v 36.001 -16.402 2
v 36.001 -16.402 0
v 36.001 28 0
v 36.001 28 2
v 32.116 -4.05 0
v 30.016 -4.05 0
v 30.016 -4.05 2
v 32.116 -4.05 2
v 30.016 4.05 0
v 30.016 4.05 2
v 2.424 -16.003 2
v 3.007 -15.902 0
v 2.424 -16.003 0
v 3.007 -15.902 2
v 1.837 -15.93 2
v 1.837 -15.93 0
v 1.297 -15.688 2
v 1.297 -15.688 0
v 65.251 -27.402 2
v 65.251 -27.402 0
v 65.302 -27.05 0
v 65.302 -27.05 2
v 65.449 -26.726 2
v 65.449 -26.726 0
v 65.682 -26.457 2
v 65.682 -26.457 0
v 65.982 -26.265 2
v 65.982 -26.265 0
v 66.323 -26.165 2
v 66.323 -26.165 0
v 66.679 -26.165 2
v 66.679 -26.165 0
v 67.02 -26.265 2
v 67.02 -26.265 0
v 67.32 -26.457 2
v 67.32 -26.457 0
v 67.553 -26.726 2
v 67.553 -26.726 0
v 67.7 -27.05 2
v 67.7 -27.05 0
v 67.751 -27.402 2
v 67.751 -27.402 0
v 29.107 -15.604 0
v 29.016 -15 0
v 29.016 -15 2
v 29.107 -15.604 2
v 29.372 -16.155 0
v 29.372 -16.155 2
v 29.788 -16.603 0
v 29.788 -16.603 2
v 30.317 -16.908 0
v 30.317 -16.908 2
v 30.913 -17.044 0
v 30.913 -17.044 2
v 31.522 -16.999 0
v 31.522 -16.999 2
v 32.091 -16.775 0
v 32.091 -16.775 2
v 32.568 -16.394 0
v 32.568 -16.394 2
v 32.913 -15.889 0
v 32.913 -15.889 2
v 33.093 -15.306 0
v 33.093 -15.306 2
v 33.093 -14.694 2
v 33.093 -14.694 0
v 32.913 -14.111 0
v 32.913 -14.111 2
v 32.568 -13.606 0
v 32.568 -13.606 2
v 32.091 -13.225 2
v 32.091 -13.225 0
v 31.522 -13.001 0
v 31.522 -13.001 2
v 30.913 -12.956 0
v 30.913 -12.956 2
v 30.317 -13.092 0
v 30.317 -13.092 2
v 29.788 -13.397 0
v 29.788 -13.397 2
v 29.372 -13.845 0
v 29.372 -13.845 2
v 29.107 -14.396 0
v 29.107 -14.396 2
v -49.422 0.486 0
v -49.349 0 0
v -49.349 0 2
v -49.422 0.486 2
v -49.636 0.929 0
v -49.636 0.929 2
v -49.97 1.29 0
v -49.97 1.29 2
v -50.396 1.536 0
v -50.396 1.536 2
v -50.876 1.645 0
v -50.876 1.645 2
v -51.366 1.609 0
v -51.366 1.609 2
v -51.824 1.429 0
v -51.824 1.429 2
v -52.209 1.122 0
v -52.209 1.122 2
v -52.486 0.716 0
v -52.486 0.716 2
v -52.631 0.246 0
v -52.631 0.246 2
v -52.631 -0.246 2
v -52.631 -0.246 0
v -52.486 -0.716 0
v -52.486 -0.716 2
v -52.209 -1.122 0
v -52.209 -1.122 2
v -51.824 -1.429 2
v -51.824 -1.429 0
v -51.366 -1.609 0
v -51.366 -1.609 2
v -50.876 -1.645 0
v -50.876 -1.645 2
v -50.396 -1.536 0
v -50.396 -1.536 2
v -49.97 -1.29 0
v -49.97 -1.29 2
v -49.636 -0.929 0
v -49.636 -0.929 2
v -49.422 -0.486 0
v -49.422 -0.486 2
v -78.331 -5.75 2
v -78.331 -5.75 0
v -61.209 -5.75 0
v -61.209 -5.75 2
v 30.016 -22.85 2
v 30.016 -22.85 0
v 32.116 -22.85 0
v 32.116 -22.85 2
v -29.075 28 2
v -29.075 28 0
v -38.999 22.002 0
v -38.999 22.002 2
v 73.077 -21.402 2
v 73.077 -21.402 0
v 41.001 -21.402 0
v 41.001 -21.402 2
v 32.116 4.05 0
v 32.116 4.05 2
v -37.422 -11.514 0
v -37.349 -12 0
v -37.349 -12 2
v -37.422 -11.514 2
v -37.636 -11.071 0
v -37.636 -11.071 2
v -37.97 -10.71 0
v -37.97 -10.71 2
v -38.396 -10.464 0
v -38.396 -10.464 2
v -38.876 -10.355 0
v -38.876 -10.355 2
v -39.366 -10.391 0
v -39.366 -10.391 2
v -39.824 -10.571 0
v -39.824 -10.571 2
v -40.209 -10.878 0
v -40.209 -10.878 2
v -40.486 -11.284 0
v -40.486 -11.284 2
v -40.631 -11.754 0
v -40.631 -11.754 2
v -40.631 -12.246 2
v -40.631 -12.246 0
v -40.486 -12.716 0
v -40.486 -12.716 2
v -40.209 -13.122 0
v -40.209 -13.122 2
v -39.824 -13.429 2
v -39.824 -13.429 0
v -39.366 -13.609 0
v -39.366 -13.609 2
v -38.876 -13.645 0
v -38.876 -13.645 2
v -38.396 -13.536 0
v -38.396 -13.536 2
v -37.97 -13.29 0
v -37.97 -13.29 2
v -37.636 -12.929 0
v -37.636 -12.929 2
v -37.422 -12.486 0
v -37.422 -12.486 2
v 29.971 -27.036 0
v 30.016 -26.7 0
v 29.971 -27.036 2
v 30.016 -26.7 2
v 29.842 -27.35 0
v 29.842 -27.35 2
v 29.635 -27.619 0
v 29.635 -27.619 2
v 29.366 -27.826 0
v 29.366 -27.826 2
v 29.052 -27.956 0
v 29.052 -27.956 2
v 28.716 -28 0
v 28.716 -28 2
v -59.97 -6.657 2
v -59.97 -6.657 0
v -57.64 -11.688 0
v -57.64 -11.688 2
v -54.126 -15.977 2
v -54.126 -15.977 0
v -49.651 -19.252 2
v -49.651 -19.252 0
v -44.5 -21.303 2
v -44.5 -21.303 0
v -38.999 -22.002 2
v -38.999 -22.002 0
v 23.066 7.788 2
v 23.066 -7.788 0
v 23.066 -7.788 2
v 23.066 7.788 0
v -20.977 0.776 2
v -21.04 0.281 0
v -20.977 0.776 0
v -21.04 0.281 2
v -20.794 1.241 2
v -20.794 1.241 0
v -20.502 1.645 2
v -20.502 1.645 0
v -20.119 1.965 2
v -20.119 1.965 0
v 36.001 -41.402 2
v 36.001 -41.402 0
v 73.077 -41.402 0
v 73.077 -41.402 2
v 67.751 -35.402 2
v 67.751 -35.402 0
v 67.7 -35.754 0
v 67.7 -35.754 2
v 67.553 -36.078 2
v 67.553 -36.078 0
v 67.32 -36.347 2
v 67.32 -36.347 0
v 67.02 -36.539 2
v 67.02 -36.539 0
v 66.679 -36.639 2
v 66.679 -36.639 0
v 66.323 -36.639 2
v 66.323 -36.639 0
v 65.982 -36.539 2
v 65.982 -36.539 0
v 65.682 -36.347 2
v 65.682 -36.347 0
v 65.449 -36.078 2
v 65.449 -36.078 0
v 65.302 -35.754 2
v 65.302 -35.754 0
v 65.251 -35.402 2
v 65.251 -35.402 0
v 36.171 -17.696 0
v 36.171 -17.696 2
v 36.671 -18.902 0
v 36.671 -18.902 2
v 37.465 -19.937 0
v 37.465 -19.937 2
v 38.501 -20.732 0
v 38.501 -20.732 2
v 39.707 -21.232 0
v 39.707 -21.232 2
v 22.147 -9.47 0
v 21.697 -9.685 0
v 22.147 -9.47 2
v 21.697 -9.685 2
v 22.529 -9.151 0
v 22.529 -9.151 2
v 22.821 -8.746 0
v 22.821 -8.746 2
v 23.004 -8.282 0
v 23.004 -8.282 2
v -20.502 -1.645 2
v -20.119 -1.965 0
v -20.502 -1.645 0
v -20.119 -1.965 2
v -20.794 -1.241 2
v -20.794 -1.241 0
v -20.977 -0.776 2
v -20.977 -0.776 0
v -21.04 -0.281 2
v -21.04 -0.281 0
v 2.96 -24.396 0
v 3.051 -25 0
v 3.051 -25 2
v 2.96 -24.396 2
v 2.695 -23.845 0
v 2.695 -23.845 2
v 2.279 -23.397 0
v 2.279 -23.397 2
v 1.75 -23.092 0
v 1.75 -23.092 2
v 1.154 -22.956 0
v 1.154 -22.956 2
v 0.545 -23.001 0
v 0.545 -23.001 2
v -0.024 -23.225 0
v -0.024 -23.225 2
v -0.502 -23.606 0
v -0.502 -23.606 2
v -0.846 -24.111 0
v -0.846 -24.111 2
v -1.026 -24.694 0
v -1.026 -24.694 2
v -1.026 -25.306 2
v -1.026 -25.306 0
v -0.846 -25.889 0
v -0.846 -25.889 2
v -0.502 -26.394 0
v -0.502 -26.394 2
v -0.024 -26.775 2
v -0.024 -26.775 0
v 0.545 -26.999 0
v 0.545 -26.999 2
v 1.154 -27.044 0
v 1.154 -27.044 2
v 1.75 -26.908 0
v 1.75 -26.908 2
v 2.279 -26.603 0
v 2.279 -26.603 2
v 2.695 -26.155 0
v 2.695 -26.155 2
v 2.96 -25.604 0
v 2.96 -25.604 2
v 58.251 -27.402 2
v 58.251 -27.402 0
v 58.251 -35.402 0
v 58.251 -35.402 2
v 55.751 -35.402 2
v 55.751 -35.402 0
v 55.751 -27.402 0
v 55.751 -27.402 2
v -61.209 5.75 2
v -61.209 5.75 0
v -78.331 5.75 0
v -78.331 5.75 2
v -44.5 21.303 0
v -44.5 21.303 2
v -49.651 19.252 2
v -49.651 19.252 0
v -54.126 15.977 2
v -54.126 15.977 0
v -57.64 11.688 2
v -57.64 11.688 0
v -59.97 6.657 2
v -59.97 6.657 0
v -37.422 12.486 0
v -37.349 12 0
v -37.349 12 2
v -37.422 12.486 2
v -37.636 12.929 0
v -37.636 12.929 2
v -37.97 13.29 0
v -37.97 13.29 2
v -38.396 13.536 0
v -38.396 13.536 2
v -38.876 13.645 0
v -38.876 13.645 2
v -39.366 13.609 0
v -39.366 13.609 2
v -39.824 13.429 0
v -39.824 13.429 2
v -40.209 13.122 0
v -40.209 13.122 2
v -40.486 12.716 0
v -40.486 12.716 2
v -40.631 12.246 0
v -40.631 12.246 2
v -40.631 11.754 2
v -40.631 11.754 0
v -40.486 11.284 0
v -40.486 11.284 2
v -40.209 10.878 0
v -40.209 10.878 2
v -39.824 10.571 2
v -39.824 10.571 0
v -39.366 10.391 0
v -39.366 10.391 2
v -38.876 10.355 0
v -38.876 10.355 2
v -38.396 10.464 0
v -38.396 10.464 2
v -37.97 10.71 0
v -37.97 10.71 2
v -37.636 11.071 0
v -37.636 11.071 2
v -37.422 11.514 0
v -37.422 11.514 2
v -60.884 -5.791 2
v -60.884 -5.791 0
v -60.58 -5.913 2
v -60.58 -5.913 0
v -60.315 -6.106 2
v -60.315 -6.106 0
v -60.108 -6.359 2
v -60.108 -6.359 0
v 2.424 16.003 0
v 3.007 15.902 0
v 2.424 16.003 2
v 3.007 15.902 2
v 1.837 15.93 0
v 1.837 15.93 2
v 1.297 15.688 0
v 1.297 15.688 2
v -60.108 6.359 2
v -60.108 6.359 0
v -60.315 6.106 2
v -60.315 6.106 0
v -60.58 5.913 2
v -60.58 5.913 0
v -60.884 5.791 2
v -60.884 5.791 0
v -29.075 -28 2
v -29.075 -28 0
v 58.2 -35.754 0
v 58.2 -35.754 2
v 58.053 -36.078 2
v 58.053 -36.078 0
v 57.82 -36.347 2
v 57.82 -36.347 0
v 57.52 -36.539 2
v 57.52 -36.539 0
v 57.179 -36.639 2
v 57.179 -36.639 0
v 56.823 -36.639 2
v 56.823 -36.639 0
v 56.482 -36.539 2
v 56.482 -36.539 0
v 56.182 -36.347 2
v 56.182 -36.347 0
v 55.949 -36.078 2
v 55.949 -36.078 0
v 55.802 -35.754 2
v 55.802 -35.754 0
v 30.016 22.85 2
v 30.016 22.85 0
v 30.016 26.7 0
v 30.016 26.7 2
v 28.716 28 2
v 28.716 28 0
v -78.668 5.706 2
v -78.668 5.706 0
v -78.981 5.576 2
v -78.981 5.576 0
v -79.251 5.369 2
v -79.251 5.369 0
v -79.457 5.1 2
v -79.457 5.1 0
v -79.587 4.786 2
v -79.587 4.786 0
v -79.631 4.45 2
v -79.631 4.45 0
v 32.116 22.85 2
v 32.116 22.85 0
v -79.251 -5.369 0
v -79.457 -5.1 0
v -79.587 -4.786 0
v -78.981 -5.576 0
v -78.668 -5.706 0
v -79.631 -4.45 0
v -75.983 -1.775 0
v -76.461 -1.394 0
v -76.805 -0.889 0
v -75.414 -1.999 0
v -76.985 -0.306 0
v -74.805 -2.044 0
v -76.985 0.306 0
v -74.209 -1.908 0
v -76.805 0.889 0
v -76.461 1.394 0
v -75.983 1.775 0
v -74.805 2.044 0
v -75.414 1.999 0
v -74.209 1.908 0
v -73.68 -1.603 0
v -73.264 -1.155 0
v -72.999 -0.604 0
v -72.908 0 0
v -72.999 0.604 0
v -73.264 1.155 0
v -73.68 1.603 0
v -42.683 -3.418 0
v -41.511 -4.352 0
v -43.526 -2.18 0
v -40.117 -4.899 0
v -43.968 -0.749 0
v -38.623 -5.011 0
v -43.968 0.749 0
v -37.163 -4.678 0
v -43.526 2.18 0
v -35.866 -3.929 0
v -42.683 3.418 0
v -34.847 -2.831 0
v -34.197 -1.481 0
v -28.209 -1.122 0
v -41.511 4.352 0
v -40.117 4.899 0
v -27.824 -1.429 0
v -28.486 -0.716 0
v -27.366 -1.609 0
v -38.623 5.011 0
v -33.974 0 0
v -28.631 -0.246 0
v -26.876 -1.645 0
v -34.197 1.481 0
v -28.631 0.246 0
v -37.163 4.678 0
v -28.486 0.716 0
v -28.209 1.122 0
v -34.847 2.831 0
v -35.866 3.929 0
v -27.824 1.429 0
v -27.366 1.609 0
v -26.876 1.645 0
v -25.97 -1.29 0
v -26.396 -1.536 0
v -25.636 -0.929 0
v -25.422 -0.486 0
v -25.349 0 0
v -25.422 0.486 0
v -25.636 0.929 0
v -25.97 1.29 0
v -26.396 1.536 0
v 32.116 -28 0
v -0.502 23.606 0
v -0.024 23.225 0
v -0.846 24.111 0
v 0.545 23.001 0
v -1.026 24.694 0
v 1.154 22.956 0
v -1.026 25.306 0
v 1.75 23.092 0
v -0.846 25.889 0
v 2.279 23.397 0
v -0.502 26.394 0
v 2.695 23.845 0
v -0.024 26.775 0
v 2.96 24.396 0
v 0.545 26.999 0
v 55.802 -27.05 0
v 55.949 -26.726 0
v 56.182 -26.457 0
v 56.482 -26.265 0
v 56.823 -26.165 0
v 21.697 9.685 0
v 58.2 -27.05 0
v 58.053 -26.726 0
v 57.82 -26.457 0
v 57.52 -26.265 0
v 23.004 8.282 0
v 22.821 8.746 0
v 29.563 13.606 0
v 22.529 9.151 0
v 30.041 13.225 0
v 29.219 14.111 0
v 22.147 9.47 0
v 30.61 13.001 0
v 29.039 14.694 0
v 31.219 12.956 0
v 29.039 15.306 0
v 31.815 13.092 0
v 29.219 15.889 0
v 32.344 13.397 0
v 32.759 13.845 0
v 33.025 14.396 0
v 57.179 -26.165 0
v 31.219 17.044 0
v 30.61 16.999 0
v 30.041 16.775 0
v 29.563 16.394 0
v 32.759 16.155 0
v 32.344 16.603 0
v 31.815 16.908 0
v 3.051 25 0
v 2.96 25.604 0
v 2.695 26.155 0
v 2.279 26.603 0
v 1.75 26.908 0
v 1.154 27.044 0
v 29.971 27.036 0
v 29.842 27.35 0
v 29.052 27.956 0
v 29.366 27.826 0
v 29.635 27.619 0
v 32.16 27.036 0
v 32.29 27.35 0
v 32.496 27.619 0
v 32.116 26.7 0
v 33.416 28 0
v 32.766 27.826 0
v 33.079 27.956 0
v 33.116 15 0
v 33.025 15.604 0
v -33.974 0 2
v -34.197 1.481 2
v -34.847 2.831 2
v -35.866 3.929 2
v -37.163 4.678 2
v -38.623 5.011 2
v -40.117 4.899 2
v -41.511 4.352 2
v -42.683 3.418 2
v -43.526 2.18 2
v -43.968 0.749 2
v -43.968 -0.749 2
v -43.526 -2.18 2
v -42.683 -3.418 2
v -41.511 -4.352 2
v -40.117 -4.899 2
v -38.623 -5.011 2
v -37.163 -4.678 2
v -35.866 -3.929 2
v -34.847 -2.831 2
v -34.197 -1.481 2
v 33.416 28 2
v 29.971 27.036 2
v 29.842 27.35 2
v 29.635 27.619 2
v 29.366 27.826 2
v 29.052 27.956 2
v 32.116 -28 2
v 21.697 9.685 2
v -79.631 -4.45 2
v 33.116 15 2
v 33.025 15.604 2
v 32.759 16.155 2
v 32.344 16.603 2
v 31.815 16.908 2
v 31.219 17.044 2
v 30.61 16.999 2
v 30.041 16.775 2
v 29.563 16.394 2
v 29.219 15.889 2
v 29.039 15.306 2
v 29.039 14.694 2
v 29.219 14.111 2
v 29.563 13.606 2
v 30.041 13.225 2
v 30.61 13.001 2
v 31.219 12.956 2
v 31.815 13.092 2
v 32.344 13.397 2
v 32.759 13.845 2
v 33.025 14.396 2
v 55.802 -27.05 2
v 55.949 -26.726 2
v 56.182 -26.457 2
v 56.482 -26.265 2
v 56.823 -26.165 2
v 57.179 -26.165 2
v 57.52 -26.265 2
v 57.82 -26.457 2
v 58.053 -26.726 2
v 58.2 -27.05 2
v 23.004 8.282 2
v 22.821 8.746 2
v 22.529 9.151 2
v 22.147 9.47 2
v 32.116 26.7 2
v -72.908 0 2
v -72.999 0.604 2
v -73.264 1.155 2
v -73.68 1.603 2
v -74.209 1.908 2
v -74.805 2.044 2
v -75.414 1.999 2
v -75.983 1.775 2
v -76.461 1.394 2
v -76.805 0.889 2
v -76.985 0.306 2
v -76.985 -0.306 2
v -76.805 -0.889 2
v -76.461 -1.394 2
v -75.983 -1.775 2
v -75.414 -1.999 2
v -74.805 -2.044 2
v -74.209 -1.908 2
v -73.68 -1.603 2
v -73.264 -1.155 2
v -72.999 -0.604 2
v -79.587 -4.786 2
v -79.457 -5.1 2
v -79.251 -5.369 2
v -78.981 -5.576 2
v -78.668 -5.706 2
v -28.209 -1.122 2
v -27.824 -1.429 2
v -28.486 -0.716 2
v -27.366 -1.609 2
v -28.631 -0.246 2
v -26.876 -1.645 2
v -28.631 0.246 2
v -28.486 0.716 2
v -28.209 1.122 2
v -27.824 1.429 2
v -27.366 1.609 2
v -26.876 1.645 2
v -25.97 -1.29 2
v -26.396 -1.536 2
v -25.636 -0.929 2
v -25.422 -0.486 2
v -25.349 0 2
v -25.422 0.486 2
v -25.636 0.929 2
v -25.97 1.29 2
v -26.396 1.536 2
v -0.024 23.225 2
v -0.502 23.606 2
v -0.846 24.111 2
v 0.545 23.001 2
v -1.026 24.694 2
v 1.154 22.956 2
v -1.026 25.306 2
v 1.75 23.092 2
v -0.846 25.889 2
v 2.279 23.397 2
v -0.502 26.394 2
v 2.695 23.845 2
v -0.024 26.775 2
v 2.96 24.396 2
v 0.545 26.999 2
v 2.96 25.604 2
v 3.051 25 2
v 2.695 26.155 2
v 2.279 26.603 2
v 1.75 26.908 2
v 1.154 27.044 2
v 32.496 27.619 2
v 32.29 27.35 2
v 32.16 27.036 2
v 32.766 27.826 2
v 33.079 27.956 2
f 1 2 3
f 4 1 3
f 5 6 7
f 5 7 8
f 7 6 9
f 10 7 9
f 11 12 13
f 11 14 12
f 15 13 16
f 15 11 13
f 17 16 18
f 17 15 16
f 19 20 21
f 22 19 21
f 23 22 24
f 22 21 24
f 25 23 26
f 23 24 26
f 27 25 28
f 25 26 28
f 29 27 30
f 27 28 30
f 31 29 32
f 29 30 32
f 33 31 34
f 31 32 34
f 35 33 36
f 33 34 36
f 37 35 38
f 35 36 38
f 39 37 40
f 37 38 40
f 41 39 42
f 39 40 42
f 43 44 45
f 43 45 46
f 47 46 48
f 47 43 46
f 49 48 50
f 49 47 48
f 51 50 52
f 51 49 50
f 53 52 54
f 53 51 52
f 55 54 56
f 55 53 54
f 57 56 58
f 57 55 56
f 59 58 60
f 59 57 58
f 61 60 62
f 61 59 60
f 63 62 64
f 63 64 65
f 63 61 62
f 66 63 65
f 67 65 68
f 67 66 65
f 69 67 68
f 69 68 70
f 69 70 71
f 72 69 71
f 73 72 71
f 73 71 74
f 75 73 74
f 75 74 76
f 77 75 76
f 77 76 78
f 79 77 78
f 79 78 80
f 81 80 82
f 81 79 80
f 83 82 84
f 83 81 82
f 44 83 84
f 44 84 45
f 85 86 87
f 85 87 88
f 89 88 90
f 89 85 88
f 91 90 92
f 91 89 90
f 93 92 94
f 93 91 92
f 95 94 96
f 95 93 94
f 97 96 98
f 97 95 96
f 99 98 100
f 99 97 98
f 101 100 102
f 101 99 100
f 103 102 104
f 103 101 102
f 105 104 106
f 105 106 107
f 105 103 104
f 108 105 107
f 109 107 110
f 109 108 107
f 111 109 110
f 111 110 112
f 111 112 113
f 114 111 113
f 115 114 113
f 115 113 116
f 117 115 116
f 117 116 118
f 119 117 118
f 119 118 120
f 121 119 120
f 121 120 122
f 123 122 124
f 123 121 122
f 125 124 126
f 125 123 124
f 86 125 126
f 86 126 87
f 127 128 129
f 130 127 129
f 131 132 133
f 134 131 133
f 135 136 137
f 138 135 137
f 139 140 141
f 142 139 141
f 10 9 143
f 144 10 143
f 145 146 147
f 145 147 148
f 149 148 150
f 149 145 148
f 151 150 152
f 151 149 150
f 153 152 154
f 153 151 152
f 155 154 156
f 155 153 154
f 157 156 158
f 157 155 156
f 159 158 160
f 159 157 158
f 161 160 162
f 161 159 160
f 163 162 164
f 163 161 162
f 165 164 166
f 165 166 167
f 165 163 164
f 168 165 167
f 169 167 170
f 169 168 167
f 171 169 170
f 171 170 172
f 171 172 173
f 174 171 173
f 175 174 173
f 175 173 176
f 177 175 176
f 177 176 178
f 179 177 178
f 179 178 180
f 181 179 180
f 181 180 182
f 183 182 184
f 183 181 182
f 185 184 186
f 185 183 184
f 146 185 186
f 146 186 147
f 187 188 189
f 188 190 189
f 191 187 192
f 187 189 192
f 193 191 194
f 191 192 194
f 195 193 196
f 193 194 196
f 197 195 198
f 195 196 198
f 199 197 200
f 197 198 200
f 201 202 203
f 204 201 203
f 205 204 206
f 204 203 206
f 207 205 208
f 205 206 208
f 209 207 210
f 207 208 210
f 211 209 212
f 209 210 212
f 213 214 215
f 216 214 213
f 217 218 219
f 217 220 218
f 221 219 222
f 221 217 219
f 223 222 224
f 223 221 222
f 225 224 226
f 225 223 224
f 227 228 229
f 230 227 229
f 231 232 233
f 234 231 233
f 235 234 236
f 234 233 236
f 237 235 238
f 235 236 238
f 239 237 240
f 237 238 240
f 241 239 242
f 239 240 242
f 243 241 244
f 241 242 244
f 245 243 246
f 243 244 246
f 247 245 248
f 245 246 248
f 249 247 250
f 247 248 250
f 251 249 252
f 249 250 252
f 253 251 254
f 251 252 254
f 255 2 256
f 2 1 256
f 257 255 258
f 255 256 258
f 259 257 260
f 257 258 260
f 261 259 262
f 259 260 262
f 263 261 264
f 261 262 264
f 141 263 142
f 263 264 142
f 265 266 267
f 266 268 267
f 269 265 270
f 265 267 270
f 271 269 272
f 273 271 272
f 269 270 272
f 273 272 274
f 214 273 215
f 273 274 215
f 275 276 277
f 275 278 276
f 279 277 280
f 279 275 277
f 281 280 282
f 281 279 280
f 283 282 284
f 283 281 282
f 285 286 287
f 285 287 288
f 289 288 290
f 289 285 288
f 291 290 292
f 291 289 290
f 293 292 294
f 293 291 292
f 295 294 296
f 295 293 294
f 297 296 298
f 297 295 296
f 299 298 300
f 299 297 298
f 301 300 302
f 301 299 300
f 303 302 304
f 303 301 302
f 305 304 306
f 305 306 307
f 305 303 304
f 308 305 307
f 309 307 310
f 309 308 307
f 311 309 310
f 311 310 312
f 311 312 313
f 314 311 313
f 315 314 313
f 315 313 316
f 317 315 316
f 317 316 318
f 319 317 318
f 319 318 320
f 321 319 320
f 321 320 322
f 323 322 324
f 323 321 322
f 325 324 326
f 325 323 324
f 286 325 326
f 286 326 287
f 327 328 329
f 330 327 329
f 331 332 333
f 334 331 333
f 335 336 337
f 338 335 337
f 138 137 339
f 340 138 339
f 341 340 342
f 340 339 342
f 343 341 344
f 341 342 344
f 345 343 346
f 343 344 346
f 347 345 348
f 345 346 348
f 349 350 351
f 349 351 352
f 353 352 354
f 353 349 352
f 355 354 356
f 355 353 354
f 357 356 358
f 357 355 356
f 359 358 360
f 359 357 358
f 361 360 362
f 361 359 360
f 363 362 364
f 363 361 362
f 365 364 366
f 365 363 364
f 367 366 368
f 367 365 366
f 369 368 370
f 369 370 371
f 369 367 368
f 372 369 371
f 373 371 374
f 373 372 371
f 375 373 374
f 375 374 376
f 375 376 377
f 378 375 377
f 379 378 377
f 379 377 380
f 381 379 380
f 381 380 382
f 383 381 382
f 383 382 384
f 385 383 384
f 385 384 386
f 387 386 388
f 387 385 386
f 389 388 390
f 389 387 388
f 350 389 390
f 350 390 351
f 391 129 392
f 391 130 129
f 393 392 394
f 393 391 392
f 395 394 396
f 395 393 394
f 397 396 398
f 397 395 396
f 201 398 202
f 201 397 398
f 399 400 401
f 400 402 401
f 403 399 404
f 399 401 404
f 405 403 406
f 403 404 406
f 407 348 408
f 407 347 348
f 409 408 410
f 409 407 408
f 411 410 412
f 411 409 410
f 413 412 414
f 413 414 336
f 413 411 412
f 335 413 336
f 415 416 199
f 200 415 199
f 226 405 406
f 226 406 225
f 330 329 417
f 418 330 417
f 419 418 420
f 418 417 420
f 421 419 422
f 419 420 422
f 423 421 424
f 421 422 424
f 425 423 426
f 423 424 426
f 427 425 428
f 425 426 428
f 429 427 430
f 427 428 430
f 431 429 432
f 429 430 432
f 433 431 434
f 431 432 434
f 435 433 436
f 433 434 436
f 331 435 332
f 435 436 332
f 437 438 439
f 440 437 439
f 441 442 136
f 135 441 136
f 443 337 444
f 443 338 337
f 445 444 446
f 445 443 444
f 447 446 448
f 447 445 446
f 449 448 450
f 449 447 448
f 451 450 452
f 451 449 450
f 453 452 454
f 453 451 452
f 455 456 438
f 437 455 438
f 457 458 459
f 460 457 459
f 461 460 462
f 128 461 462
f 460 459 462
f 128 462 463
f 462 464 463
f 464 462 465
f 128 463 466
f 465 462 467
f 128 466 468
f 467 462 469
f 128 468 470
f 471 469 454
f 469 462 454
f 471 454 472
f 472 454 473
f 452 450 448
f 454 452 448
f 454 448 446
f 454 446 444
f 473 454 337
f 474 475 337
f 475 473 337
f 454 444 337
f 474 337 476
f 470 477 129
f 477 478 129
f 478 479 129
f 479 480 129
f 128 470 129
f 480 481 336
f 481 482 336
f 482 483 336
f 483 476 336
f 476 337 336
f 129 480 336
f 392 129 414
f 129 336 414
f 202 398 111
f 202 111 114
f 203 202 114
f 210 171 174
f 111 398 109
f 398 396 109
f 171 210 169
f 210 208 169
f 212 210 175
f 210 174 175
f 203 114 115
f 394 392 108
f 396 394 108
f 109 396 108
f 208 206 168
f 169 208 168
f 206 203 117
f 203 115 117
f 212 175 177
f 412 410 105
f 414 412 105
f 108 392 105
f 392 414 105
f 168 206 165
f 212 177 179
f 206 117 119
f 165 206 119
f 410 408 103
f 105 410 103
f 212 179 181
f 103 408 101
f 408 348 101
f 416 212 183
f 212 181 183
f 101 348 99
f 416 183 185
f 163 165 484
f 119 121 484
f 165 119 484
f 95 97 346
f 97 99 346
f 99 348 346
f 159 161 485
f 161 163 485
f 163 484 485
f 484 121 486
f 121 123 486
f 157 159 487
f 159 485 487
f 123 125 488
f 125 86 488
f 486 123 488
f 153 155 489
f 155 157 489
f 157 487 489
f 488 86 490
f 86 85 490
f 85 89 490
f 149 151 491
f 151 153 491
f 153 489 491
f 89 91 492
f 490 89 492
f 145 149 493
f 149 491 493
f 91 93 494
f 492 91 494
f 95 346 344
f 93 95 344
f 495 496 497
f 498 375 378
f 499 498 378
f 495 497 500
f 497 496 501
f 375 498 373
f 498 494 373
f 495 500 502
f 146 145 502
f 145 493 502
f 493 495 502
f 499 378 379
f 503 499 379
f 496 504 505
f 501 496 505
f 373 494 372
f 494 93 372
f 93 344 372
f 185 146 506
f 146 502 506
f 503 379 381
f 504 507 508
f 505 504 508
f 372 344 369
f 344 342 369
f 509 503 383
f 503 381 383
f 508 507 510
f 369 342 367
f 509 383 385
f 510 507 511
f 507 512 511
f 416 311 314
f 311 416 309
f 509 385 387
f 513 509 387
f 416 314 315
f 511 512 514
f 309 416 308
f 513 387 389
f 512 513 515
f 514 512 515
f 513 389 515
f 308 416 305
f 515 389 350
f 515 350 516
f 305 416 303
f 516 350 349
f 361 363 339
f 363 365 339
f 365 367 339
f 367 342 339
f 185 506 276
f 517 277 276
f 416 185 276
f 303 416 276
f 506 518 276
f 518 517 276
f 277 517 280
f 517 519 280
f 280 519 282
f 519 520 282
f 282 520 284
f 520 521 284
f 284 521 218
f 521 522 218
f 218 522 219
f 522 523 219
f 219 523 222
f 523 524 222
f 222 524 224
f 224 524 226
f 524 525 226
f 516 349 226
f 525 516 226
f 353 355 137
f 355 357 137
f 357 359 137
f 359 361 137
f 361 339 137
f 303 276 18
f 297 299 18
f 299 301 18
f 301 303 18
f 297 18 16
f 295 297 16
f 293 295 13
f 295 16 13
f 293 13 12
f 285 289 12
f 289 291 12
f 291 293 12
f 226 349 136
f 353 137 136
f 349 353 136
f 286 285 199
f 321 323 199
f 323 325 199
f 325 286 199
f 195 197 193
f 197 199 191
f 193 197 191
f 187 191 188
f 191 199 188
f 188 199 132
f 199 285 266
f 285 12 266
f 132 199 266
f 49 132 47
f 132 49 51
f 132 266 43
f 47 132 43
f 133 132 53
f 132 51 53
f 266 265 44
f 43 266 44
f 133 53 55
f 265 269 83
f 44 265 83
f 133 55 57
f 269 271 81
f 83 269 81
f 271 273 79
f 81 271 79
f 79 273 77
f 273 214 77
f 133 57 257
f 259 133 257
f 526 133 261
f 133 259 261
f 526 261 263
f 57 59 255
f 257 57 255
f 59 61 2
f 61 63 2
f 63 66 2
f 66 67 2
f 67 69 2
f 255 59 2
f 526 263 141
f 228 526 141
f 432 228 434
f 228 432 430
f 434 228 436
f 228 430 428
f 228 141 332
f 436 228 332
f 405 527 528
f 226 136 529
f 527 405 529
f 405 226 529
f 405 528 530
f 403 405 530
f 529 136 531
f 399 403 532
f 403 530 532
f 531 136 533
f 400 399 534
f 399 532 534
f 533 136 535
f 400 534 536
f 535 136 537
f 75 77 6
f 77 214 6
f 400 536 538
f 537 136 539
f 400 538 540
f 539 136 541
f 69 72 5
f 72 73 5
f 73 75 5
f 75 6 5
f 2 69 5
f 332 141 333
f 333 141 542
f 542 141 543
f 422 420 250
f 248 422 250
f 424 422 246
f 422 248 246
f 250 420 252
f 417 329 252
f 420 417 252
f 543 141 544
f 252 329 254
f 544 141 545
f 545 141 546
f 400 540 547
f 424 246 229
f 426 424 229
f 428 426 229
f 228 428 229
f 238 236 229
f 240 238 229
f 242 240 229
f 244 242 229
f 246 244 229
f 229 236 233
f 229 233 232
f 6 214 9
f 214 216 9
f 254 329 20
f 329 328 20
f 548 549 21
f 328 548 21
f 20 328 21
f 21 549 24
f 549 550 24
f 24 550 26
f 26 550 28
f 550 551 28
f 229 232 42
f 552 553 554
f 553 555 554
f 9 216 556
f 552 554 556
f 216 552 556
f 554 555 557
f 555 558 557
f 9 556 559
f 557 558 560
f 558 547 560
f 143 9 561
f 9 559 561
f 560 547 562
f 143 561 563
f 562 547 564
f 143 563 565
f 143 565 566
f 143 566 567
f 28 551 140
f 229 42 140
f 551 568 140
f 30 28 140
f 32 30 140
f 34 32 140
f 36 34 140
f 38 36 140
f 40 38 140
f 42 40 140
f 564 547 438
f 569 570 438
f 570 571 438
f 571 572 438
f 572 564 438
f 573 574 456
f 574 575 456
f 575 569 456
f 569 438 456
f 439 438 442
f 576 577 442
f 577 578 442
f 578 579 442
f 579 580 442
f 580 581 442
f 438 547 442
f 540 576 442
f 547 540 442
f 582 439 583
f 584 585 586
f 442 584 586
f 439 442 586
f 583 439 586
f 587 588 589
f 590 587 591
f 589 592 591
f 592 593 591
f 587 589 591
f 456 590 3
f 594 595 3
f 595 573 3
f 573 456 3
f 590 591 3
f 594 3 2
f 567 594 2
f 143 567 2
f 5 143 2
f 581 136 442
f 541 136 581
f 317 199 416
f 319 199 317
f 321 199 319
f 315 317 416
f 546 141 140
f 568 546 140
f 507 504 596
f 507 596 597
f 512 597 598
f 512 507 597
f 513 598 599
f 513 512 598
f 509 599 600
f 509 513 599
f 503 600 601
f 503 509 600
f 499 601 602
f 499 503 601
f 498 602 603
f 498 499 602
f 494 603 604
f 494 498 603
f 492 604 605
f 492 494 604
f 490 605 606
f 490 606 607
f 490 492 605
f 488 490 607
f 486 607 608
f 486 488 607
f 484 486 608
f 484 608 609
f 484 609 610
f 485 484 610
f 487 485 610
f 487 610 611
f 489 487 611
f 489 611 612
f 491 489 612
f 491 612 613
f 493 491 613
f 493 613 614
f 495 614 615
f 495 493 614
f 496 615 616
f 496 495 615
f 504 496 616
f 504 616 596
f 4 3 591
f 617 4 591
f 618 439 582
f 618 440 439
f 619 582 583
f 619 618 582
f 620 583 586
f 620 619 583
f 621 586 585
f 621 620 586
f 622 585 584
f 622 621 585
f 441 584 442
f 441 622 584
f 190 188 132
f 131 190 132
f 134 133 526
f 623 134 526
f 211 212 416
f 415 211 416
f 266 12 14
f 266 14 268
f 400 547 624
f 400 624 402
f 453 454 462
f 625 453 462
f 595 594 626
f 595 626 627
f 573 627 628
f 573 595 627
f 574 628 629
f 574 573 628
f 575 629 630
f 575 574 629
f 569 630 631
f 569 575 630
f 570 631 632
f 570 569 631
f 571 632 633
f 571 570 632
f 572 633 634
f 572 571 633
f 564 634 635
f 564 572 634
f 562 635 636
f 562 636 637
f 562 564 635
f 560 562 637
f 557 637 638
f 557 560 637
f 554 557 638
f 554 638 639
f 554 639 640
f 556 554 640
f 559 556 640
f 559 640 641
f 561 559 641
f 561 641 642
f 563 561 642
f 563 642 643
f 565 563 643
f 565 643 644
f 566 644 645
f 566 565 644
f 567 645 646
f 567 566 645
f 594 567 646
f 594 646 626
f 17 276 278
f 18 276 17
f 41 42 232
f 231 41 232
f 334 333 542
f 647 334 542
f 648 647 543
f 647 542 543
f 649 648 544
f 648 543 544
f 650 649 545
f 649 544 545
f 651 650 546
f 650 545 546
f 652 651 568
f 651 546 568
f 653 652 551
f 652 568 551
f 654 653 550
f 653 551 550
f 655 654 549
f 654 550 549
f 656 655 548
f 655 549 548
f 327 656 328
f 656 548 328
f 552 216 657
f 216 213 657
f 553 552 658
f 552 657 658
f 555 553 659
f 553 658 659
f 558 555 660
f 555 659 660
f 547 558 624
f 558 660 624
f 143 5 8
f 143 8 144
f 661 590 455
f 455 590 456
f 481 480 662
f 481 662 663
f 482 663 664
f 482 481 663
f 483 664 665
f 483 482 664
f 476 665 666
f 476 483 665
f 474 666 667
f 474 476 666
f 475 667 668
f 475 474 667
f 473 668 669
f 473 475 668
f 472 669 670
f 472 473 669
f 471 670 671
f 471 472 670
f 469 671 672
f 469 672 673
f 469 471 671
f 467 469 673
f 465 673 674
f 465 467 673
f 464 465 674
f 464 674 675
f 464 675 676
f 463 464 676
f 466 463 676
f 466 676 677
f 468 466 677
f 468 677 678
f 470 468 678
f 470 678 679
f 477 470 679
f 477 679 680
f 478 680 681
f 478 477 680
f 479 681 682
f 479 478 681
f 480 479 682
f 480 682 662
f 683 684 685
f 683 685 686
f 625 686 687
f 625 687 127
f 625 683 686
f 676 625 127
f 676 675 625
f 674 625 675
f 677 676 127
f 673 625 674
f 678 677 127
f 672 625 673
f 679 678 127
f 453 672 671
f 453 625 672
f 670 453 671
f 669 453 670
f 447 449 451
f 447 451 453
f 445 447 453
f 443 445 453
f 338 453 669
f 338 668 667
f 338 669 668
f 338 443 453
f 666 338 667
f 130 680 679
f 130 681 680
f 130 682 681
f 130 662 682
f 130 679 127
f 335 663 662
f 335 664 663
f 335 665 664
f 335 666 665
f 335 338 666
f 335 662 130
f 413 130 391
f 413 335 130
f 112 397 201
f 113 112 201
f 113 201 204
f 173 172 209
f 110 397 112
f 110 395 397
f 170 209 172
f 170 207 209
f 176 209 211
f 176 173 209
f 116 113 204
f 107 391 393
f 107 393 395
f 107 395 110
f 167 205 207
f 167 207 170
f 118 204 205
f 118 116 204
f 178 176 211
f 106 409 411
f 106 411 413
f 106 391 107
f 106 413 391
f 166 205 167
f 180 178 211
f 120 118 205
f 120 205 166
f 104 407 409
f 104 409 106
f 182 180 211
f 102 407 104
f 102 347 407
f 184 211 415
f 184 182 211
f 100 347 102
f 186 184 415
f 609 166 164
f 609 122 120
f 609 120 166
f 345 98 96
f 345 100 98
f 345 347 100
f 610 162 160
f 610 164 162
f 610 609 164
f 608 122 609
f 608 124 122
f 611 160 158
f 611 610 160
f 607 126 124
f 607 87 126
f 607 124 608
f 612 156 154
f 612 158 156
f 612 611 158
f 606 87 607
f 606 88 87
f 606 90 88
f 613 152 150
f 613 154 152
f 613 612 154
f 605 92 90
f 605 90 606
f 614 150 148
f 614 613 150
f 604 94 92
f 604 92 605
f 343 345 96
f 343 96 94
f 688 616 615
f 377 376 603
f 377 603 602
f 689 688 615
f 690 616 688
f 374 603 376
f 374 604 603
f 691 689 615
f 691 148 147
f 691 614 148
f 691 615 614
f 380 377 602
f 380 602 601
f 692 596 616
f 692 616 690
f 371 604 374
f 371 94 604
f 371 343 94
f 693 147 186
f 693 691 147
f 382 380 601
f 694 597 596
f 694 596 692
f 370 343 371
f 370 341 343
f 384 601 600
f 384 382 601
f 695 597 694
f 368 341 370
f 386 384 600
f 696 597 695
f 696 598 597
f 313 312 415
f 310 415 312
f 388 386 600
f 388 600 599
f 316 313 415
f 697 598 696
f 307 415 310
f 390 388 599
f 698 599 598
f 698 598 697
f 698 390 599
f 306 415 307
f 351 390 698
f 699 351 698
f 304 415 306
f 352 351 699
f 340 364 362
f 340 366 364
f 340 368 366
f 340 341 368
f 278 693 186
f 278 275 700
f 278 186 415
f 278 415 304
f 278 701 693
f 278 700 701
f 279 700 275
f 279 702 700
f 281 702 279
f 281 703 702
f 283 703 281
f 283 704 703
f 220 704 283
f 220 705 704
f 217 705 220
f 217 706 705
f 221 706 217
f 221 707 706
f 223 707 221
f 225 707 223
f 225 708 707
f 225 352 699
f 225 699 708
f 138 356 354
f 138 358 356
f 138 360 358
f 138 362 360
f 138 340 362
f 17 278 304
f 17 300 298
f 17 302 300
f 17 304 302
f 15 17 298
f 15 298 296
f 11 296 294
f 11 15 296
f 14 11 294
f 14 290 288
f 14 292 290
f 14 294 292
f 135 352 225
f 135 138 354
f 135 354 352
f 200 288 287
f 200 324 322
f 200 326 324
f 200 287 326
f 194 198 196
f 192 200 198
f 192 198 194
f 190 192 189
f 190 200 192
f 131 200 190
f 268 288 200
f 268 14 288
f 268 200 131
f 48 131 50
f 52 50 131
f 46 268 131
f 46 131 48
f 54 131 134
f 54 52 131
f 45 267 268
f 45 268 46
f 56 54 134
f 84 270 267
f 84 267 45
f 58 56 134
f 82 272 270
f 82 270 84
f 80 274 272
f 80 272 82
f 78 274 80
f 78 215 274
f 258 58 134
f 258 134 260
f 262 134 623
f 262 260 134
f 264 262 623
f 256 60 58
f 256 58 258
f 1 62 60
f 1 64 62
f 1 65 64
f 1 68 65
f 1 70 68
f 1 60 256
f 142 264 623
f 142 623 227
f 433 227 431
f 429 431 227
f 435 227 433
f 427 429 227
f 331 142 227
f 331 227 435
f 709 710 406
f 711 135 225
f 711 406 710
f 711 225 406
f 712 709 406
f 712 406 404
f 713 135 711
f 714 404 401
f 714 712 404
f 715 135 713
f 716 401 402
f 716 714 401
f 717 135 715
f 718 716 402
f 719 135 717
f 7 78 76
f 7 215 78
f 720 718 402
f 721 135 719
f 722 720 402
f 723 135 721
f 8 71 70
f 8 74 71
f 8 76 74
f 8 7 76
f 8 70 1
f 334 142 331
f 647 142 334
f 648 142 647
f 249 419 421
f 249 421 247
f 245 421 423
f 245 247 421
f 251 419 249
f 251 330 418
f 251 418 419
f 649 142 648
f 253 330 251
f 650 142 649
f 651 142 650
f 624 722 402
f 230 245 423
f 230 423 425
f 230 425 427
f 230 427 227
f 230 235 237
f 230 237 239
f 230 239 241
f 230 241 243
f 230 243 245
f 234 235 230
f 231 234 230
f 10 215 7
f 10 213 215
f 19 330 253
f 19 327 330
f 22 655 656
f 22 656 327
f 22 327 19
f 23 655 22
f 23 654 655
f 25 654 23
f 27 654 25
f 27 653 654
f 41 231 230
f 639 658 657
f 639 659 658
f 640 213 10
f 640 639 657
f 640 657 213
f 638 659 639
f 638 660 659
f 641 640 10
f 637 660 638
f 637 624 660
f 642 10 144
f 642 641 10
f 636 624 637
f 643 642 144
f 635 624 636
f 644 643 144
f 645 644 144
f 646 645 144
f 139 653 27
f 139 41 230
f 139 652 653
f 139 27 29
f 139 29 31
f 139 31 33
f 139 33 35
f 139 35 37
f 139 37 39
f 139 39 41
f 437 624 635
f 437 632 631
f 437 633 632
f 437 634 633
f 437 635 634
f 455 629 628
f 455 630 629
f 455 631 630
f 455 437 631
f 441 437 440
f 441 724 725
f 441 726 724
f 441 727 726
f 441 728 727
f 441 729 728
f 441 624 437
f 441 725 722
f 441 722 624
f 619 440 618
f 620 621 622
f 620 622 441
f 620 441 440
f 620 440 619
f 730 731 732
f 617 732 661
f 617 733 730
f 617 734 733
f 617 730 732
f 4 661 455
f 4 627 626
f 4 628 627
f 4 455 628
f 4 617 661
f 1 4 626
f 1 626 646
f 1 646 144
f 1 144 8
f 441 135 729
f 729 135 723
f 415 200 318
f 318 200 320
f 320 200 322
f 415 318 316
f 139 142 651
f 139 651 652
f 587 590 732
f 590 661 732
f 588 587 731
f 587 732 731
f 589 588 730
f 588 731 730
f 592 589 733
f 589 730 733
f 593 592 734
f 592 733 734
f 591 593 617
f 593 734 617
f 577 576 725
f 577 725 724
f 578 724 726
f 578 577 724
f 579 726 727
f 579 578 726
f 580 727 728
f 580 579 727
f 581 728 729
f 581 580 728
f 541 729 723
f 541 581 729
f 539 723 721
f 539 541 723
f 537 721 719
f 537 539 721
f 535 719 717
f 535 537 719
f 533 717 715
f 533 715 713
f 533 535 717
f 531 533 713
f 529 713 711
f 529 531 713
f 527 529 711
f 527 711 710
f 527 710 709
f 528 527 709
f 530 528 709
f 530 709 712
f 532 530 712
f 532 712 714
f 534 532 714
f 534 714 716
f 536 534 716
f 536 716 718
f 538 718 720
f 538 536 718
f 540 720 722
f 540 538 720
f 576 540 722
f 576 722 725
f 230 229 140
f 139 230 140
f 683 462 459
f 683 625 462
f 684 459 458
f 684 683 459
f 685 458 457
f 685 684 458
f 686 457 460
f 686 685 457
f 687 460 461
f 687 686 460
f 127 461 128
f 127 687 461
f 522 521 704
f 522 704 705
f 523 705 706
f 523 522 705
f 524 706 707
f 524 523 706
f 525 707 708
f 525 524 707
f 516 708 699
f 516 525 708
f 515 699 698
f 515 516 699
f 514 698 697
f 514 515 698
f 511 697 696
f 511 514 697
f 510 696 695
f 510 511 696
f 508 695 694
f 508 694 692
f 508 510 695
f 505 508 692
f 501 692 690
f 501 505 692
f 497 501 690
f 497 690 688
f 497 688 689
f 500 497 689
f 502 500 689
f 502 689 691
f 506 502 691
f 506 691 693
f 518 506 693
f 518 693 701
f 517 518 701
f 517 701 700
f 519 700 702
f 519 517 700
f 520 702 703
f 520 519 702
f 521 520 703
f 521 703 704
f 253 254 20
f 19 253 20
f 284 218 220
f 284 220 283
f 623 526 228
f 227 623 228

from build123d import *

# Parameters (mm, degrees)
SKETCH_1_R      = 2.05
SKETCH_1_R_2    = 5.025
SKETCH_1_R_3    = 1.65
SKETCH_1_W      = 2.1
SKETCH_1_H      = 8.1
EXTRUDE_1_DEPTH = 2
FILLET_1_R      = 1.3
FILLET_2_R      = 2
FILLET_3_R      = 5


with BuildPart() as part:
    # 草图1 → 凸台-拉伸1 (new body)
    with BuildSketch(Plane.XY):
        with BuildLine():
            Line((32.115707856, 28), (32.115707856, 22.85))
            Line((32.115707856, 22.85), (30.015707856, 22.85))
            Line((30.015707856, 22.85), (30.015707856, 28))
            Line((30.015707856, 28), (-29.075, 28))
            Line((-29.075, 28), (-38.998995168, 22.002009663))
            ThreePointArc((-38.998995168, 22.002009663), (-52.370174504, 17.472835843), (-60.236366221, 5.75))
            Line((-60.236366221, 5.75), (-79.631279411, 5.75))
            Line((-79.631279411, 5.75), (-79.631279411, -5.75))
            Line((-79.631279411, -5.75), (-60.236366221, -5.75))
            ThreePointArc((-60.236366221, -5.75), (-52.370174504, -17.472835843), (-38.998995168, -22.002009663))
            Line((-38.998995168, -22.002009663), (-29.075, -28))
            Line((-29.075, -28), (30.015707856, -28))
            Line((30.015707856, -28), (30.015707856, -22.85))
            Line((30.015707856, -22.85), (32.115707856, -22.85))
            Line((32.115707856, -22.85), (32.115707856, -28))
            Line((32.115707856, -28), (36.001004832, -41.401911511))
            Line((36.001004832, -41.401911511), (73.077470353, -41.401911511))
            Line((73.077470353, -41.401911511), (73.077470353, -21.401911511))
            Line((73.077470353, -21.401911511), (36.001004832, -21.401911511))
            Line((36.001004832, -21.401911511), (36.001004832, 28))
            Line((36.001004832, 28), (32.115707856, 28))
        make_face()
        with Locations((31.065707856, 15)):
            Circle(SKETCH_1_R, mode=Mode.SUBTRACT)
        with Locations(Location((31.065707856, -15, 0), (0, 0, 180))):
            Circle(SKETCH_1_R, mode=Mode.SUBTRACT)
        with Locations((-38.998995168, 0)):
            Circle(SKETCH_1_R_2, mode=Mode.SUBTRACT)
        with Locations((1.001004832, -25)):
            Circle(SKETCH_1_R, mode=Mode.SUBTRACT)
        with Locations((1.001004832, 25)):
            Circle(SKETCH_1_R, mode=Mode.SUBTRACT)
        with Locations((-74.958287312, 0)):
            Circle(SKETCH_1_R, mode=Mode.SUBTRACT)
        with Locations((-50.998995168, 0)):
            Circle(SKETCH_1_R_3, mode=Mode.SUBTRACT)
        with Locations((-38.998995168, 12)):
            Circle(SKETCH_1_R_3, mode=Mode.SUBTRACT)
        with Locations((-26.998995168, 0)):
            Circle(SKETCH_1_R_3, mode=Mode.SUBTRACT)
        with Locations((-38.998995168, -12)):
            Circle(SKETCH_1_R_3, mode=Mode.SUBTRACT)
        with Locations((31.065707856, 0)):
            Rectangle(SKETCH_1_W, SKETCH_1_H, mode=Mode.SUBTRACT)
        Polygon((2.100885183, -16.20323489), (23.065707856, -9.230000311), (23.065707856, 9.230000311), (2.100885183, 16.20323489), (-21.039703025, 1.3748119), (-21.039703025, -1.3748119), align=None, mode=Mode.SUBTRACT)
        with BuildLine():
            Line((55.751004832, -35.401911511), (55.751004832, -27.401911511))
            ThreePointArc((55.751004832, -27.401911511), (57.001004832, -26.151911511), (58.251004832, -27.401911511))
            Line((58.251004832, -27.401911511), (58.251004832, -35.401911511))
            ThreePointArc((58.251004832, -35.401911511), (57.001004832, -36.651911511), (55.751004832, -35.401911511))
        make_face(mode=Mode.SUBTRACT)
        with BuildLine():
            Line((67.751004832, -27.401911511), (67.751004832, -35.401911511))
            ThreePointArc((67.751004832, -35.401911511), (66.501004832, -36.651911511), (65.251004832, -35.401911511))
            Line((65.251004832, -35.401911511), (65.251004832, -27.401911511))
            ThreePointArc((65.251004832, -27.401911511), (66.501004832, -26.151911511), (67.751004832, -27.401911511))
        make_face(mode=Mode.SUBTRACT)
    extrude(amount=EXTRUDE_1_DEPTH)

    # 圆角1
    fillet_1_edges = [part.edges().sort_by_distance(p)[0] for p in [
        (-60.236366221, -5.75, 1),
        (-79.631279411, -5.75, 1),
        (-79.631279411, 5.75, 1),
        (-60.236366221, 5.75, 1),
        (30.015707856, 28, 1),
        (32.115707856, 28, 1),
        (30.015707856, -28, 1),
    ]]
    fillet(fillet_1_edges, radius=FILLET_1_R)

    # 圆角2
    fillet_2_edges = [part.edges().sort_by_distance(p)[0] for p in [
        (2.100885183, -16.20323489, 1),
        (23.065707856, -9.230000311, 1),
        (23.065707856, 9.230000311, 1),
        (2.100885183, 16.20323489, 1),
        (-21.039703025, 1.3748119, 1),
        (-21.039703025, -1.3748119, 1),
    ]]
    fillet(fillet_2_edges, radius=FILLET_2_R)

    # 圆角3
    fillet_3_edges = [part.edges().sort_by_distance(p)[0] for p in [
        (36.001004832, -21.401911511, 1),
    ]]
    fillet(fillet_3_edges, radius=FILLET_3_R)


solid = part.part
